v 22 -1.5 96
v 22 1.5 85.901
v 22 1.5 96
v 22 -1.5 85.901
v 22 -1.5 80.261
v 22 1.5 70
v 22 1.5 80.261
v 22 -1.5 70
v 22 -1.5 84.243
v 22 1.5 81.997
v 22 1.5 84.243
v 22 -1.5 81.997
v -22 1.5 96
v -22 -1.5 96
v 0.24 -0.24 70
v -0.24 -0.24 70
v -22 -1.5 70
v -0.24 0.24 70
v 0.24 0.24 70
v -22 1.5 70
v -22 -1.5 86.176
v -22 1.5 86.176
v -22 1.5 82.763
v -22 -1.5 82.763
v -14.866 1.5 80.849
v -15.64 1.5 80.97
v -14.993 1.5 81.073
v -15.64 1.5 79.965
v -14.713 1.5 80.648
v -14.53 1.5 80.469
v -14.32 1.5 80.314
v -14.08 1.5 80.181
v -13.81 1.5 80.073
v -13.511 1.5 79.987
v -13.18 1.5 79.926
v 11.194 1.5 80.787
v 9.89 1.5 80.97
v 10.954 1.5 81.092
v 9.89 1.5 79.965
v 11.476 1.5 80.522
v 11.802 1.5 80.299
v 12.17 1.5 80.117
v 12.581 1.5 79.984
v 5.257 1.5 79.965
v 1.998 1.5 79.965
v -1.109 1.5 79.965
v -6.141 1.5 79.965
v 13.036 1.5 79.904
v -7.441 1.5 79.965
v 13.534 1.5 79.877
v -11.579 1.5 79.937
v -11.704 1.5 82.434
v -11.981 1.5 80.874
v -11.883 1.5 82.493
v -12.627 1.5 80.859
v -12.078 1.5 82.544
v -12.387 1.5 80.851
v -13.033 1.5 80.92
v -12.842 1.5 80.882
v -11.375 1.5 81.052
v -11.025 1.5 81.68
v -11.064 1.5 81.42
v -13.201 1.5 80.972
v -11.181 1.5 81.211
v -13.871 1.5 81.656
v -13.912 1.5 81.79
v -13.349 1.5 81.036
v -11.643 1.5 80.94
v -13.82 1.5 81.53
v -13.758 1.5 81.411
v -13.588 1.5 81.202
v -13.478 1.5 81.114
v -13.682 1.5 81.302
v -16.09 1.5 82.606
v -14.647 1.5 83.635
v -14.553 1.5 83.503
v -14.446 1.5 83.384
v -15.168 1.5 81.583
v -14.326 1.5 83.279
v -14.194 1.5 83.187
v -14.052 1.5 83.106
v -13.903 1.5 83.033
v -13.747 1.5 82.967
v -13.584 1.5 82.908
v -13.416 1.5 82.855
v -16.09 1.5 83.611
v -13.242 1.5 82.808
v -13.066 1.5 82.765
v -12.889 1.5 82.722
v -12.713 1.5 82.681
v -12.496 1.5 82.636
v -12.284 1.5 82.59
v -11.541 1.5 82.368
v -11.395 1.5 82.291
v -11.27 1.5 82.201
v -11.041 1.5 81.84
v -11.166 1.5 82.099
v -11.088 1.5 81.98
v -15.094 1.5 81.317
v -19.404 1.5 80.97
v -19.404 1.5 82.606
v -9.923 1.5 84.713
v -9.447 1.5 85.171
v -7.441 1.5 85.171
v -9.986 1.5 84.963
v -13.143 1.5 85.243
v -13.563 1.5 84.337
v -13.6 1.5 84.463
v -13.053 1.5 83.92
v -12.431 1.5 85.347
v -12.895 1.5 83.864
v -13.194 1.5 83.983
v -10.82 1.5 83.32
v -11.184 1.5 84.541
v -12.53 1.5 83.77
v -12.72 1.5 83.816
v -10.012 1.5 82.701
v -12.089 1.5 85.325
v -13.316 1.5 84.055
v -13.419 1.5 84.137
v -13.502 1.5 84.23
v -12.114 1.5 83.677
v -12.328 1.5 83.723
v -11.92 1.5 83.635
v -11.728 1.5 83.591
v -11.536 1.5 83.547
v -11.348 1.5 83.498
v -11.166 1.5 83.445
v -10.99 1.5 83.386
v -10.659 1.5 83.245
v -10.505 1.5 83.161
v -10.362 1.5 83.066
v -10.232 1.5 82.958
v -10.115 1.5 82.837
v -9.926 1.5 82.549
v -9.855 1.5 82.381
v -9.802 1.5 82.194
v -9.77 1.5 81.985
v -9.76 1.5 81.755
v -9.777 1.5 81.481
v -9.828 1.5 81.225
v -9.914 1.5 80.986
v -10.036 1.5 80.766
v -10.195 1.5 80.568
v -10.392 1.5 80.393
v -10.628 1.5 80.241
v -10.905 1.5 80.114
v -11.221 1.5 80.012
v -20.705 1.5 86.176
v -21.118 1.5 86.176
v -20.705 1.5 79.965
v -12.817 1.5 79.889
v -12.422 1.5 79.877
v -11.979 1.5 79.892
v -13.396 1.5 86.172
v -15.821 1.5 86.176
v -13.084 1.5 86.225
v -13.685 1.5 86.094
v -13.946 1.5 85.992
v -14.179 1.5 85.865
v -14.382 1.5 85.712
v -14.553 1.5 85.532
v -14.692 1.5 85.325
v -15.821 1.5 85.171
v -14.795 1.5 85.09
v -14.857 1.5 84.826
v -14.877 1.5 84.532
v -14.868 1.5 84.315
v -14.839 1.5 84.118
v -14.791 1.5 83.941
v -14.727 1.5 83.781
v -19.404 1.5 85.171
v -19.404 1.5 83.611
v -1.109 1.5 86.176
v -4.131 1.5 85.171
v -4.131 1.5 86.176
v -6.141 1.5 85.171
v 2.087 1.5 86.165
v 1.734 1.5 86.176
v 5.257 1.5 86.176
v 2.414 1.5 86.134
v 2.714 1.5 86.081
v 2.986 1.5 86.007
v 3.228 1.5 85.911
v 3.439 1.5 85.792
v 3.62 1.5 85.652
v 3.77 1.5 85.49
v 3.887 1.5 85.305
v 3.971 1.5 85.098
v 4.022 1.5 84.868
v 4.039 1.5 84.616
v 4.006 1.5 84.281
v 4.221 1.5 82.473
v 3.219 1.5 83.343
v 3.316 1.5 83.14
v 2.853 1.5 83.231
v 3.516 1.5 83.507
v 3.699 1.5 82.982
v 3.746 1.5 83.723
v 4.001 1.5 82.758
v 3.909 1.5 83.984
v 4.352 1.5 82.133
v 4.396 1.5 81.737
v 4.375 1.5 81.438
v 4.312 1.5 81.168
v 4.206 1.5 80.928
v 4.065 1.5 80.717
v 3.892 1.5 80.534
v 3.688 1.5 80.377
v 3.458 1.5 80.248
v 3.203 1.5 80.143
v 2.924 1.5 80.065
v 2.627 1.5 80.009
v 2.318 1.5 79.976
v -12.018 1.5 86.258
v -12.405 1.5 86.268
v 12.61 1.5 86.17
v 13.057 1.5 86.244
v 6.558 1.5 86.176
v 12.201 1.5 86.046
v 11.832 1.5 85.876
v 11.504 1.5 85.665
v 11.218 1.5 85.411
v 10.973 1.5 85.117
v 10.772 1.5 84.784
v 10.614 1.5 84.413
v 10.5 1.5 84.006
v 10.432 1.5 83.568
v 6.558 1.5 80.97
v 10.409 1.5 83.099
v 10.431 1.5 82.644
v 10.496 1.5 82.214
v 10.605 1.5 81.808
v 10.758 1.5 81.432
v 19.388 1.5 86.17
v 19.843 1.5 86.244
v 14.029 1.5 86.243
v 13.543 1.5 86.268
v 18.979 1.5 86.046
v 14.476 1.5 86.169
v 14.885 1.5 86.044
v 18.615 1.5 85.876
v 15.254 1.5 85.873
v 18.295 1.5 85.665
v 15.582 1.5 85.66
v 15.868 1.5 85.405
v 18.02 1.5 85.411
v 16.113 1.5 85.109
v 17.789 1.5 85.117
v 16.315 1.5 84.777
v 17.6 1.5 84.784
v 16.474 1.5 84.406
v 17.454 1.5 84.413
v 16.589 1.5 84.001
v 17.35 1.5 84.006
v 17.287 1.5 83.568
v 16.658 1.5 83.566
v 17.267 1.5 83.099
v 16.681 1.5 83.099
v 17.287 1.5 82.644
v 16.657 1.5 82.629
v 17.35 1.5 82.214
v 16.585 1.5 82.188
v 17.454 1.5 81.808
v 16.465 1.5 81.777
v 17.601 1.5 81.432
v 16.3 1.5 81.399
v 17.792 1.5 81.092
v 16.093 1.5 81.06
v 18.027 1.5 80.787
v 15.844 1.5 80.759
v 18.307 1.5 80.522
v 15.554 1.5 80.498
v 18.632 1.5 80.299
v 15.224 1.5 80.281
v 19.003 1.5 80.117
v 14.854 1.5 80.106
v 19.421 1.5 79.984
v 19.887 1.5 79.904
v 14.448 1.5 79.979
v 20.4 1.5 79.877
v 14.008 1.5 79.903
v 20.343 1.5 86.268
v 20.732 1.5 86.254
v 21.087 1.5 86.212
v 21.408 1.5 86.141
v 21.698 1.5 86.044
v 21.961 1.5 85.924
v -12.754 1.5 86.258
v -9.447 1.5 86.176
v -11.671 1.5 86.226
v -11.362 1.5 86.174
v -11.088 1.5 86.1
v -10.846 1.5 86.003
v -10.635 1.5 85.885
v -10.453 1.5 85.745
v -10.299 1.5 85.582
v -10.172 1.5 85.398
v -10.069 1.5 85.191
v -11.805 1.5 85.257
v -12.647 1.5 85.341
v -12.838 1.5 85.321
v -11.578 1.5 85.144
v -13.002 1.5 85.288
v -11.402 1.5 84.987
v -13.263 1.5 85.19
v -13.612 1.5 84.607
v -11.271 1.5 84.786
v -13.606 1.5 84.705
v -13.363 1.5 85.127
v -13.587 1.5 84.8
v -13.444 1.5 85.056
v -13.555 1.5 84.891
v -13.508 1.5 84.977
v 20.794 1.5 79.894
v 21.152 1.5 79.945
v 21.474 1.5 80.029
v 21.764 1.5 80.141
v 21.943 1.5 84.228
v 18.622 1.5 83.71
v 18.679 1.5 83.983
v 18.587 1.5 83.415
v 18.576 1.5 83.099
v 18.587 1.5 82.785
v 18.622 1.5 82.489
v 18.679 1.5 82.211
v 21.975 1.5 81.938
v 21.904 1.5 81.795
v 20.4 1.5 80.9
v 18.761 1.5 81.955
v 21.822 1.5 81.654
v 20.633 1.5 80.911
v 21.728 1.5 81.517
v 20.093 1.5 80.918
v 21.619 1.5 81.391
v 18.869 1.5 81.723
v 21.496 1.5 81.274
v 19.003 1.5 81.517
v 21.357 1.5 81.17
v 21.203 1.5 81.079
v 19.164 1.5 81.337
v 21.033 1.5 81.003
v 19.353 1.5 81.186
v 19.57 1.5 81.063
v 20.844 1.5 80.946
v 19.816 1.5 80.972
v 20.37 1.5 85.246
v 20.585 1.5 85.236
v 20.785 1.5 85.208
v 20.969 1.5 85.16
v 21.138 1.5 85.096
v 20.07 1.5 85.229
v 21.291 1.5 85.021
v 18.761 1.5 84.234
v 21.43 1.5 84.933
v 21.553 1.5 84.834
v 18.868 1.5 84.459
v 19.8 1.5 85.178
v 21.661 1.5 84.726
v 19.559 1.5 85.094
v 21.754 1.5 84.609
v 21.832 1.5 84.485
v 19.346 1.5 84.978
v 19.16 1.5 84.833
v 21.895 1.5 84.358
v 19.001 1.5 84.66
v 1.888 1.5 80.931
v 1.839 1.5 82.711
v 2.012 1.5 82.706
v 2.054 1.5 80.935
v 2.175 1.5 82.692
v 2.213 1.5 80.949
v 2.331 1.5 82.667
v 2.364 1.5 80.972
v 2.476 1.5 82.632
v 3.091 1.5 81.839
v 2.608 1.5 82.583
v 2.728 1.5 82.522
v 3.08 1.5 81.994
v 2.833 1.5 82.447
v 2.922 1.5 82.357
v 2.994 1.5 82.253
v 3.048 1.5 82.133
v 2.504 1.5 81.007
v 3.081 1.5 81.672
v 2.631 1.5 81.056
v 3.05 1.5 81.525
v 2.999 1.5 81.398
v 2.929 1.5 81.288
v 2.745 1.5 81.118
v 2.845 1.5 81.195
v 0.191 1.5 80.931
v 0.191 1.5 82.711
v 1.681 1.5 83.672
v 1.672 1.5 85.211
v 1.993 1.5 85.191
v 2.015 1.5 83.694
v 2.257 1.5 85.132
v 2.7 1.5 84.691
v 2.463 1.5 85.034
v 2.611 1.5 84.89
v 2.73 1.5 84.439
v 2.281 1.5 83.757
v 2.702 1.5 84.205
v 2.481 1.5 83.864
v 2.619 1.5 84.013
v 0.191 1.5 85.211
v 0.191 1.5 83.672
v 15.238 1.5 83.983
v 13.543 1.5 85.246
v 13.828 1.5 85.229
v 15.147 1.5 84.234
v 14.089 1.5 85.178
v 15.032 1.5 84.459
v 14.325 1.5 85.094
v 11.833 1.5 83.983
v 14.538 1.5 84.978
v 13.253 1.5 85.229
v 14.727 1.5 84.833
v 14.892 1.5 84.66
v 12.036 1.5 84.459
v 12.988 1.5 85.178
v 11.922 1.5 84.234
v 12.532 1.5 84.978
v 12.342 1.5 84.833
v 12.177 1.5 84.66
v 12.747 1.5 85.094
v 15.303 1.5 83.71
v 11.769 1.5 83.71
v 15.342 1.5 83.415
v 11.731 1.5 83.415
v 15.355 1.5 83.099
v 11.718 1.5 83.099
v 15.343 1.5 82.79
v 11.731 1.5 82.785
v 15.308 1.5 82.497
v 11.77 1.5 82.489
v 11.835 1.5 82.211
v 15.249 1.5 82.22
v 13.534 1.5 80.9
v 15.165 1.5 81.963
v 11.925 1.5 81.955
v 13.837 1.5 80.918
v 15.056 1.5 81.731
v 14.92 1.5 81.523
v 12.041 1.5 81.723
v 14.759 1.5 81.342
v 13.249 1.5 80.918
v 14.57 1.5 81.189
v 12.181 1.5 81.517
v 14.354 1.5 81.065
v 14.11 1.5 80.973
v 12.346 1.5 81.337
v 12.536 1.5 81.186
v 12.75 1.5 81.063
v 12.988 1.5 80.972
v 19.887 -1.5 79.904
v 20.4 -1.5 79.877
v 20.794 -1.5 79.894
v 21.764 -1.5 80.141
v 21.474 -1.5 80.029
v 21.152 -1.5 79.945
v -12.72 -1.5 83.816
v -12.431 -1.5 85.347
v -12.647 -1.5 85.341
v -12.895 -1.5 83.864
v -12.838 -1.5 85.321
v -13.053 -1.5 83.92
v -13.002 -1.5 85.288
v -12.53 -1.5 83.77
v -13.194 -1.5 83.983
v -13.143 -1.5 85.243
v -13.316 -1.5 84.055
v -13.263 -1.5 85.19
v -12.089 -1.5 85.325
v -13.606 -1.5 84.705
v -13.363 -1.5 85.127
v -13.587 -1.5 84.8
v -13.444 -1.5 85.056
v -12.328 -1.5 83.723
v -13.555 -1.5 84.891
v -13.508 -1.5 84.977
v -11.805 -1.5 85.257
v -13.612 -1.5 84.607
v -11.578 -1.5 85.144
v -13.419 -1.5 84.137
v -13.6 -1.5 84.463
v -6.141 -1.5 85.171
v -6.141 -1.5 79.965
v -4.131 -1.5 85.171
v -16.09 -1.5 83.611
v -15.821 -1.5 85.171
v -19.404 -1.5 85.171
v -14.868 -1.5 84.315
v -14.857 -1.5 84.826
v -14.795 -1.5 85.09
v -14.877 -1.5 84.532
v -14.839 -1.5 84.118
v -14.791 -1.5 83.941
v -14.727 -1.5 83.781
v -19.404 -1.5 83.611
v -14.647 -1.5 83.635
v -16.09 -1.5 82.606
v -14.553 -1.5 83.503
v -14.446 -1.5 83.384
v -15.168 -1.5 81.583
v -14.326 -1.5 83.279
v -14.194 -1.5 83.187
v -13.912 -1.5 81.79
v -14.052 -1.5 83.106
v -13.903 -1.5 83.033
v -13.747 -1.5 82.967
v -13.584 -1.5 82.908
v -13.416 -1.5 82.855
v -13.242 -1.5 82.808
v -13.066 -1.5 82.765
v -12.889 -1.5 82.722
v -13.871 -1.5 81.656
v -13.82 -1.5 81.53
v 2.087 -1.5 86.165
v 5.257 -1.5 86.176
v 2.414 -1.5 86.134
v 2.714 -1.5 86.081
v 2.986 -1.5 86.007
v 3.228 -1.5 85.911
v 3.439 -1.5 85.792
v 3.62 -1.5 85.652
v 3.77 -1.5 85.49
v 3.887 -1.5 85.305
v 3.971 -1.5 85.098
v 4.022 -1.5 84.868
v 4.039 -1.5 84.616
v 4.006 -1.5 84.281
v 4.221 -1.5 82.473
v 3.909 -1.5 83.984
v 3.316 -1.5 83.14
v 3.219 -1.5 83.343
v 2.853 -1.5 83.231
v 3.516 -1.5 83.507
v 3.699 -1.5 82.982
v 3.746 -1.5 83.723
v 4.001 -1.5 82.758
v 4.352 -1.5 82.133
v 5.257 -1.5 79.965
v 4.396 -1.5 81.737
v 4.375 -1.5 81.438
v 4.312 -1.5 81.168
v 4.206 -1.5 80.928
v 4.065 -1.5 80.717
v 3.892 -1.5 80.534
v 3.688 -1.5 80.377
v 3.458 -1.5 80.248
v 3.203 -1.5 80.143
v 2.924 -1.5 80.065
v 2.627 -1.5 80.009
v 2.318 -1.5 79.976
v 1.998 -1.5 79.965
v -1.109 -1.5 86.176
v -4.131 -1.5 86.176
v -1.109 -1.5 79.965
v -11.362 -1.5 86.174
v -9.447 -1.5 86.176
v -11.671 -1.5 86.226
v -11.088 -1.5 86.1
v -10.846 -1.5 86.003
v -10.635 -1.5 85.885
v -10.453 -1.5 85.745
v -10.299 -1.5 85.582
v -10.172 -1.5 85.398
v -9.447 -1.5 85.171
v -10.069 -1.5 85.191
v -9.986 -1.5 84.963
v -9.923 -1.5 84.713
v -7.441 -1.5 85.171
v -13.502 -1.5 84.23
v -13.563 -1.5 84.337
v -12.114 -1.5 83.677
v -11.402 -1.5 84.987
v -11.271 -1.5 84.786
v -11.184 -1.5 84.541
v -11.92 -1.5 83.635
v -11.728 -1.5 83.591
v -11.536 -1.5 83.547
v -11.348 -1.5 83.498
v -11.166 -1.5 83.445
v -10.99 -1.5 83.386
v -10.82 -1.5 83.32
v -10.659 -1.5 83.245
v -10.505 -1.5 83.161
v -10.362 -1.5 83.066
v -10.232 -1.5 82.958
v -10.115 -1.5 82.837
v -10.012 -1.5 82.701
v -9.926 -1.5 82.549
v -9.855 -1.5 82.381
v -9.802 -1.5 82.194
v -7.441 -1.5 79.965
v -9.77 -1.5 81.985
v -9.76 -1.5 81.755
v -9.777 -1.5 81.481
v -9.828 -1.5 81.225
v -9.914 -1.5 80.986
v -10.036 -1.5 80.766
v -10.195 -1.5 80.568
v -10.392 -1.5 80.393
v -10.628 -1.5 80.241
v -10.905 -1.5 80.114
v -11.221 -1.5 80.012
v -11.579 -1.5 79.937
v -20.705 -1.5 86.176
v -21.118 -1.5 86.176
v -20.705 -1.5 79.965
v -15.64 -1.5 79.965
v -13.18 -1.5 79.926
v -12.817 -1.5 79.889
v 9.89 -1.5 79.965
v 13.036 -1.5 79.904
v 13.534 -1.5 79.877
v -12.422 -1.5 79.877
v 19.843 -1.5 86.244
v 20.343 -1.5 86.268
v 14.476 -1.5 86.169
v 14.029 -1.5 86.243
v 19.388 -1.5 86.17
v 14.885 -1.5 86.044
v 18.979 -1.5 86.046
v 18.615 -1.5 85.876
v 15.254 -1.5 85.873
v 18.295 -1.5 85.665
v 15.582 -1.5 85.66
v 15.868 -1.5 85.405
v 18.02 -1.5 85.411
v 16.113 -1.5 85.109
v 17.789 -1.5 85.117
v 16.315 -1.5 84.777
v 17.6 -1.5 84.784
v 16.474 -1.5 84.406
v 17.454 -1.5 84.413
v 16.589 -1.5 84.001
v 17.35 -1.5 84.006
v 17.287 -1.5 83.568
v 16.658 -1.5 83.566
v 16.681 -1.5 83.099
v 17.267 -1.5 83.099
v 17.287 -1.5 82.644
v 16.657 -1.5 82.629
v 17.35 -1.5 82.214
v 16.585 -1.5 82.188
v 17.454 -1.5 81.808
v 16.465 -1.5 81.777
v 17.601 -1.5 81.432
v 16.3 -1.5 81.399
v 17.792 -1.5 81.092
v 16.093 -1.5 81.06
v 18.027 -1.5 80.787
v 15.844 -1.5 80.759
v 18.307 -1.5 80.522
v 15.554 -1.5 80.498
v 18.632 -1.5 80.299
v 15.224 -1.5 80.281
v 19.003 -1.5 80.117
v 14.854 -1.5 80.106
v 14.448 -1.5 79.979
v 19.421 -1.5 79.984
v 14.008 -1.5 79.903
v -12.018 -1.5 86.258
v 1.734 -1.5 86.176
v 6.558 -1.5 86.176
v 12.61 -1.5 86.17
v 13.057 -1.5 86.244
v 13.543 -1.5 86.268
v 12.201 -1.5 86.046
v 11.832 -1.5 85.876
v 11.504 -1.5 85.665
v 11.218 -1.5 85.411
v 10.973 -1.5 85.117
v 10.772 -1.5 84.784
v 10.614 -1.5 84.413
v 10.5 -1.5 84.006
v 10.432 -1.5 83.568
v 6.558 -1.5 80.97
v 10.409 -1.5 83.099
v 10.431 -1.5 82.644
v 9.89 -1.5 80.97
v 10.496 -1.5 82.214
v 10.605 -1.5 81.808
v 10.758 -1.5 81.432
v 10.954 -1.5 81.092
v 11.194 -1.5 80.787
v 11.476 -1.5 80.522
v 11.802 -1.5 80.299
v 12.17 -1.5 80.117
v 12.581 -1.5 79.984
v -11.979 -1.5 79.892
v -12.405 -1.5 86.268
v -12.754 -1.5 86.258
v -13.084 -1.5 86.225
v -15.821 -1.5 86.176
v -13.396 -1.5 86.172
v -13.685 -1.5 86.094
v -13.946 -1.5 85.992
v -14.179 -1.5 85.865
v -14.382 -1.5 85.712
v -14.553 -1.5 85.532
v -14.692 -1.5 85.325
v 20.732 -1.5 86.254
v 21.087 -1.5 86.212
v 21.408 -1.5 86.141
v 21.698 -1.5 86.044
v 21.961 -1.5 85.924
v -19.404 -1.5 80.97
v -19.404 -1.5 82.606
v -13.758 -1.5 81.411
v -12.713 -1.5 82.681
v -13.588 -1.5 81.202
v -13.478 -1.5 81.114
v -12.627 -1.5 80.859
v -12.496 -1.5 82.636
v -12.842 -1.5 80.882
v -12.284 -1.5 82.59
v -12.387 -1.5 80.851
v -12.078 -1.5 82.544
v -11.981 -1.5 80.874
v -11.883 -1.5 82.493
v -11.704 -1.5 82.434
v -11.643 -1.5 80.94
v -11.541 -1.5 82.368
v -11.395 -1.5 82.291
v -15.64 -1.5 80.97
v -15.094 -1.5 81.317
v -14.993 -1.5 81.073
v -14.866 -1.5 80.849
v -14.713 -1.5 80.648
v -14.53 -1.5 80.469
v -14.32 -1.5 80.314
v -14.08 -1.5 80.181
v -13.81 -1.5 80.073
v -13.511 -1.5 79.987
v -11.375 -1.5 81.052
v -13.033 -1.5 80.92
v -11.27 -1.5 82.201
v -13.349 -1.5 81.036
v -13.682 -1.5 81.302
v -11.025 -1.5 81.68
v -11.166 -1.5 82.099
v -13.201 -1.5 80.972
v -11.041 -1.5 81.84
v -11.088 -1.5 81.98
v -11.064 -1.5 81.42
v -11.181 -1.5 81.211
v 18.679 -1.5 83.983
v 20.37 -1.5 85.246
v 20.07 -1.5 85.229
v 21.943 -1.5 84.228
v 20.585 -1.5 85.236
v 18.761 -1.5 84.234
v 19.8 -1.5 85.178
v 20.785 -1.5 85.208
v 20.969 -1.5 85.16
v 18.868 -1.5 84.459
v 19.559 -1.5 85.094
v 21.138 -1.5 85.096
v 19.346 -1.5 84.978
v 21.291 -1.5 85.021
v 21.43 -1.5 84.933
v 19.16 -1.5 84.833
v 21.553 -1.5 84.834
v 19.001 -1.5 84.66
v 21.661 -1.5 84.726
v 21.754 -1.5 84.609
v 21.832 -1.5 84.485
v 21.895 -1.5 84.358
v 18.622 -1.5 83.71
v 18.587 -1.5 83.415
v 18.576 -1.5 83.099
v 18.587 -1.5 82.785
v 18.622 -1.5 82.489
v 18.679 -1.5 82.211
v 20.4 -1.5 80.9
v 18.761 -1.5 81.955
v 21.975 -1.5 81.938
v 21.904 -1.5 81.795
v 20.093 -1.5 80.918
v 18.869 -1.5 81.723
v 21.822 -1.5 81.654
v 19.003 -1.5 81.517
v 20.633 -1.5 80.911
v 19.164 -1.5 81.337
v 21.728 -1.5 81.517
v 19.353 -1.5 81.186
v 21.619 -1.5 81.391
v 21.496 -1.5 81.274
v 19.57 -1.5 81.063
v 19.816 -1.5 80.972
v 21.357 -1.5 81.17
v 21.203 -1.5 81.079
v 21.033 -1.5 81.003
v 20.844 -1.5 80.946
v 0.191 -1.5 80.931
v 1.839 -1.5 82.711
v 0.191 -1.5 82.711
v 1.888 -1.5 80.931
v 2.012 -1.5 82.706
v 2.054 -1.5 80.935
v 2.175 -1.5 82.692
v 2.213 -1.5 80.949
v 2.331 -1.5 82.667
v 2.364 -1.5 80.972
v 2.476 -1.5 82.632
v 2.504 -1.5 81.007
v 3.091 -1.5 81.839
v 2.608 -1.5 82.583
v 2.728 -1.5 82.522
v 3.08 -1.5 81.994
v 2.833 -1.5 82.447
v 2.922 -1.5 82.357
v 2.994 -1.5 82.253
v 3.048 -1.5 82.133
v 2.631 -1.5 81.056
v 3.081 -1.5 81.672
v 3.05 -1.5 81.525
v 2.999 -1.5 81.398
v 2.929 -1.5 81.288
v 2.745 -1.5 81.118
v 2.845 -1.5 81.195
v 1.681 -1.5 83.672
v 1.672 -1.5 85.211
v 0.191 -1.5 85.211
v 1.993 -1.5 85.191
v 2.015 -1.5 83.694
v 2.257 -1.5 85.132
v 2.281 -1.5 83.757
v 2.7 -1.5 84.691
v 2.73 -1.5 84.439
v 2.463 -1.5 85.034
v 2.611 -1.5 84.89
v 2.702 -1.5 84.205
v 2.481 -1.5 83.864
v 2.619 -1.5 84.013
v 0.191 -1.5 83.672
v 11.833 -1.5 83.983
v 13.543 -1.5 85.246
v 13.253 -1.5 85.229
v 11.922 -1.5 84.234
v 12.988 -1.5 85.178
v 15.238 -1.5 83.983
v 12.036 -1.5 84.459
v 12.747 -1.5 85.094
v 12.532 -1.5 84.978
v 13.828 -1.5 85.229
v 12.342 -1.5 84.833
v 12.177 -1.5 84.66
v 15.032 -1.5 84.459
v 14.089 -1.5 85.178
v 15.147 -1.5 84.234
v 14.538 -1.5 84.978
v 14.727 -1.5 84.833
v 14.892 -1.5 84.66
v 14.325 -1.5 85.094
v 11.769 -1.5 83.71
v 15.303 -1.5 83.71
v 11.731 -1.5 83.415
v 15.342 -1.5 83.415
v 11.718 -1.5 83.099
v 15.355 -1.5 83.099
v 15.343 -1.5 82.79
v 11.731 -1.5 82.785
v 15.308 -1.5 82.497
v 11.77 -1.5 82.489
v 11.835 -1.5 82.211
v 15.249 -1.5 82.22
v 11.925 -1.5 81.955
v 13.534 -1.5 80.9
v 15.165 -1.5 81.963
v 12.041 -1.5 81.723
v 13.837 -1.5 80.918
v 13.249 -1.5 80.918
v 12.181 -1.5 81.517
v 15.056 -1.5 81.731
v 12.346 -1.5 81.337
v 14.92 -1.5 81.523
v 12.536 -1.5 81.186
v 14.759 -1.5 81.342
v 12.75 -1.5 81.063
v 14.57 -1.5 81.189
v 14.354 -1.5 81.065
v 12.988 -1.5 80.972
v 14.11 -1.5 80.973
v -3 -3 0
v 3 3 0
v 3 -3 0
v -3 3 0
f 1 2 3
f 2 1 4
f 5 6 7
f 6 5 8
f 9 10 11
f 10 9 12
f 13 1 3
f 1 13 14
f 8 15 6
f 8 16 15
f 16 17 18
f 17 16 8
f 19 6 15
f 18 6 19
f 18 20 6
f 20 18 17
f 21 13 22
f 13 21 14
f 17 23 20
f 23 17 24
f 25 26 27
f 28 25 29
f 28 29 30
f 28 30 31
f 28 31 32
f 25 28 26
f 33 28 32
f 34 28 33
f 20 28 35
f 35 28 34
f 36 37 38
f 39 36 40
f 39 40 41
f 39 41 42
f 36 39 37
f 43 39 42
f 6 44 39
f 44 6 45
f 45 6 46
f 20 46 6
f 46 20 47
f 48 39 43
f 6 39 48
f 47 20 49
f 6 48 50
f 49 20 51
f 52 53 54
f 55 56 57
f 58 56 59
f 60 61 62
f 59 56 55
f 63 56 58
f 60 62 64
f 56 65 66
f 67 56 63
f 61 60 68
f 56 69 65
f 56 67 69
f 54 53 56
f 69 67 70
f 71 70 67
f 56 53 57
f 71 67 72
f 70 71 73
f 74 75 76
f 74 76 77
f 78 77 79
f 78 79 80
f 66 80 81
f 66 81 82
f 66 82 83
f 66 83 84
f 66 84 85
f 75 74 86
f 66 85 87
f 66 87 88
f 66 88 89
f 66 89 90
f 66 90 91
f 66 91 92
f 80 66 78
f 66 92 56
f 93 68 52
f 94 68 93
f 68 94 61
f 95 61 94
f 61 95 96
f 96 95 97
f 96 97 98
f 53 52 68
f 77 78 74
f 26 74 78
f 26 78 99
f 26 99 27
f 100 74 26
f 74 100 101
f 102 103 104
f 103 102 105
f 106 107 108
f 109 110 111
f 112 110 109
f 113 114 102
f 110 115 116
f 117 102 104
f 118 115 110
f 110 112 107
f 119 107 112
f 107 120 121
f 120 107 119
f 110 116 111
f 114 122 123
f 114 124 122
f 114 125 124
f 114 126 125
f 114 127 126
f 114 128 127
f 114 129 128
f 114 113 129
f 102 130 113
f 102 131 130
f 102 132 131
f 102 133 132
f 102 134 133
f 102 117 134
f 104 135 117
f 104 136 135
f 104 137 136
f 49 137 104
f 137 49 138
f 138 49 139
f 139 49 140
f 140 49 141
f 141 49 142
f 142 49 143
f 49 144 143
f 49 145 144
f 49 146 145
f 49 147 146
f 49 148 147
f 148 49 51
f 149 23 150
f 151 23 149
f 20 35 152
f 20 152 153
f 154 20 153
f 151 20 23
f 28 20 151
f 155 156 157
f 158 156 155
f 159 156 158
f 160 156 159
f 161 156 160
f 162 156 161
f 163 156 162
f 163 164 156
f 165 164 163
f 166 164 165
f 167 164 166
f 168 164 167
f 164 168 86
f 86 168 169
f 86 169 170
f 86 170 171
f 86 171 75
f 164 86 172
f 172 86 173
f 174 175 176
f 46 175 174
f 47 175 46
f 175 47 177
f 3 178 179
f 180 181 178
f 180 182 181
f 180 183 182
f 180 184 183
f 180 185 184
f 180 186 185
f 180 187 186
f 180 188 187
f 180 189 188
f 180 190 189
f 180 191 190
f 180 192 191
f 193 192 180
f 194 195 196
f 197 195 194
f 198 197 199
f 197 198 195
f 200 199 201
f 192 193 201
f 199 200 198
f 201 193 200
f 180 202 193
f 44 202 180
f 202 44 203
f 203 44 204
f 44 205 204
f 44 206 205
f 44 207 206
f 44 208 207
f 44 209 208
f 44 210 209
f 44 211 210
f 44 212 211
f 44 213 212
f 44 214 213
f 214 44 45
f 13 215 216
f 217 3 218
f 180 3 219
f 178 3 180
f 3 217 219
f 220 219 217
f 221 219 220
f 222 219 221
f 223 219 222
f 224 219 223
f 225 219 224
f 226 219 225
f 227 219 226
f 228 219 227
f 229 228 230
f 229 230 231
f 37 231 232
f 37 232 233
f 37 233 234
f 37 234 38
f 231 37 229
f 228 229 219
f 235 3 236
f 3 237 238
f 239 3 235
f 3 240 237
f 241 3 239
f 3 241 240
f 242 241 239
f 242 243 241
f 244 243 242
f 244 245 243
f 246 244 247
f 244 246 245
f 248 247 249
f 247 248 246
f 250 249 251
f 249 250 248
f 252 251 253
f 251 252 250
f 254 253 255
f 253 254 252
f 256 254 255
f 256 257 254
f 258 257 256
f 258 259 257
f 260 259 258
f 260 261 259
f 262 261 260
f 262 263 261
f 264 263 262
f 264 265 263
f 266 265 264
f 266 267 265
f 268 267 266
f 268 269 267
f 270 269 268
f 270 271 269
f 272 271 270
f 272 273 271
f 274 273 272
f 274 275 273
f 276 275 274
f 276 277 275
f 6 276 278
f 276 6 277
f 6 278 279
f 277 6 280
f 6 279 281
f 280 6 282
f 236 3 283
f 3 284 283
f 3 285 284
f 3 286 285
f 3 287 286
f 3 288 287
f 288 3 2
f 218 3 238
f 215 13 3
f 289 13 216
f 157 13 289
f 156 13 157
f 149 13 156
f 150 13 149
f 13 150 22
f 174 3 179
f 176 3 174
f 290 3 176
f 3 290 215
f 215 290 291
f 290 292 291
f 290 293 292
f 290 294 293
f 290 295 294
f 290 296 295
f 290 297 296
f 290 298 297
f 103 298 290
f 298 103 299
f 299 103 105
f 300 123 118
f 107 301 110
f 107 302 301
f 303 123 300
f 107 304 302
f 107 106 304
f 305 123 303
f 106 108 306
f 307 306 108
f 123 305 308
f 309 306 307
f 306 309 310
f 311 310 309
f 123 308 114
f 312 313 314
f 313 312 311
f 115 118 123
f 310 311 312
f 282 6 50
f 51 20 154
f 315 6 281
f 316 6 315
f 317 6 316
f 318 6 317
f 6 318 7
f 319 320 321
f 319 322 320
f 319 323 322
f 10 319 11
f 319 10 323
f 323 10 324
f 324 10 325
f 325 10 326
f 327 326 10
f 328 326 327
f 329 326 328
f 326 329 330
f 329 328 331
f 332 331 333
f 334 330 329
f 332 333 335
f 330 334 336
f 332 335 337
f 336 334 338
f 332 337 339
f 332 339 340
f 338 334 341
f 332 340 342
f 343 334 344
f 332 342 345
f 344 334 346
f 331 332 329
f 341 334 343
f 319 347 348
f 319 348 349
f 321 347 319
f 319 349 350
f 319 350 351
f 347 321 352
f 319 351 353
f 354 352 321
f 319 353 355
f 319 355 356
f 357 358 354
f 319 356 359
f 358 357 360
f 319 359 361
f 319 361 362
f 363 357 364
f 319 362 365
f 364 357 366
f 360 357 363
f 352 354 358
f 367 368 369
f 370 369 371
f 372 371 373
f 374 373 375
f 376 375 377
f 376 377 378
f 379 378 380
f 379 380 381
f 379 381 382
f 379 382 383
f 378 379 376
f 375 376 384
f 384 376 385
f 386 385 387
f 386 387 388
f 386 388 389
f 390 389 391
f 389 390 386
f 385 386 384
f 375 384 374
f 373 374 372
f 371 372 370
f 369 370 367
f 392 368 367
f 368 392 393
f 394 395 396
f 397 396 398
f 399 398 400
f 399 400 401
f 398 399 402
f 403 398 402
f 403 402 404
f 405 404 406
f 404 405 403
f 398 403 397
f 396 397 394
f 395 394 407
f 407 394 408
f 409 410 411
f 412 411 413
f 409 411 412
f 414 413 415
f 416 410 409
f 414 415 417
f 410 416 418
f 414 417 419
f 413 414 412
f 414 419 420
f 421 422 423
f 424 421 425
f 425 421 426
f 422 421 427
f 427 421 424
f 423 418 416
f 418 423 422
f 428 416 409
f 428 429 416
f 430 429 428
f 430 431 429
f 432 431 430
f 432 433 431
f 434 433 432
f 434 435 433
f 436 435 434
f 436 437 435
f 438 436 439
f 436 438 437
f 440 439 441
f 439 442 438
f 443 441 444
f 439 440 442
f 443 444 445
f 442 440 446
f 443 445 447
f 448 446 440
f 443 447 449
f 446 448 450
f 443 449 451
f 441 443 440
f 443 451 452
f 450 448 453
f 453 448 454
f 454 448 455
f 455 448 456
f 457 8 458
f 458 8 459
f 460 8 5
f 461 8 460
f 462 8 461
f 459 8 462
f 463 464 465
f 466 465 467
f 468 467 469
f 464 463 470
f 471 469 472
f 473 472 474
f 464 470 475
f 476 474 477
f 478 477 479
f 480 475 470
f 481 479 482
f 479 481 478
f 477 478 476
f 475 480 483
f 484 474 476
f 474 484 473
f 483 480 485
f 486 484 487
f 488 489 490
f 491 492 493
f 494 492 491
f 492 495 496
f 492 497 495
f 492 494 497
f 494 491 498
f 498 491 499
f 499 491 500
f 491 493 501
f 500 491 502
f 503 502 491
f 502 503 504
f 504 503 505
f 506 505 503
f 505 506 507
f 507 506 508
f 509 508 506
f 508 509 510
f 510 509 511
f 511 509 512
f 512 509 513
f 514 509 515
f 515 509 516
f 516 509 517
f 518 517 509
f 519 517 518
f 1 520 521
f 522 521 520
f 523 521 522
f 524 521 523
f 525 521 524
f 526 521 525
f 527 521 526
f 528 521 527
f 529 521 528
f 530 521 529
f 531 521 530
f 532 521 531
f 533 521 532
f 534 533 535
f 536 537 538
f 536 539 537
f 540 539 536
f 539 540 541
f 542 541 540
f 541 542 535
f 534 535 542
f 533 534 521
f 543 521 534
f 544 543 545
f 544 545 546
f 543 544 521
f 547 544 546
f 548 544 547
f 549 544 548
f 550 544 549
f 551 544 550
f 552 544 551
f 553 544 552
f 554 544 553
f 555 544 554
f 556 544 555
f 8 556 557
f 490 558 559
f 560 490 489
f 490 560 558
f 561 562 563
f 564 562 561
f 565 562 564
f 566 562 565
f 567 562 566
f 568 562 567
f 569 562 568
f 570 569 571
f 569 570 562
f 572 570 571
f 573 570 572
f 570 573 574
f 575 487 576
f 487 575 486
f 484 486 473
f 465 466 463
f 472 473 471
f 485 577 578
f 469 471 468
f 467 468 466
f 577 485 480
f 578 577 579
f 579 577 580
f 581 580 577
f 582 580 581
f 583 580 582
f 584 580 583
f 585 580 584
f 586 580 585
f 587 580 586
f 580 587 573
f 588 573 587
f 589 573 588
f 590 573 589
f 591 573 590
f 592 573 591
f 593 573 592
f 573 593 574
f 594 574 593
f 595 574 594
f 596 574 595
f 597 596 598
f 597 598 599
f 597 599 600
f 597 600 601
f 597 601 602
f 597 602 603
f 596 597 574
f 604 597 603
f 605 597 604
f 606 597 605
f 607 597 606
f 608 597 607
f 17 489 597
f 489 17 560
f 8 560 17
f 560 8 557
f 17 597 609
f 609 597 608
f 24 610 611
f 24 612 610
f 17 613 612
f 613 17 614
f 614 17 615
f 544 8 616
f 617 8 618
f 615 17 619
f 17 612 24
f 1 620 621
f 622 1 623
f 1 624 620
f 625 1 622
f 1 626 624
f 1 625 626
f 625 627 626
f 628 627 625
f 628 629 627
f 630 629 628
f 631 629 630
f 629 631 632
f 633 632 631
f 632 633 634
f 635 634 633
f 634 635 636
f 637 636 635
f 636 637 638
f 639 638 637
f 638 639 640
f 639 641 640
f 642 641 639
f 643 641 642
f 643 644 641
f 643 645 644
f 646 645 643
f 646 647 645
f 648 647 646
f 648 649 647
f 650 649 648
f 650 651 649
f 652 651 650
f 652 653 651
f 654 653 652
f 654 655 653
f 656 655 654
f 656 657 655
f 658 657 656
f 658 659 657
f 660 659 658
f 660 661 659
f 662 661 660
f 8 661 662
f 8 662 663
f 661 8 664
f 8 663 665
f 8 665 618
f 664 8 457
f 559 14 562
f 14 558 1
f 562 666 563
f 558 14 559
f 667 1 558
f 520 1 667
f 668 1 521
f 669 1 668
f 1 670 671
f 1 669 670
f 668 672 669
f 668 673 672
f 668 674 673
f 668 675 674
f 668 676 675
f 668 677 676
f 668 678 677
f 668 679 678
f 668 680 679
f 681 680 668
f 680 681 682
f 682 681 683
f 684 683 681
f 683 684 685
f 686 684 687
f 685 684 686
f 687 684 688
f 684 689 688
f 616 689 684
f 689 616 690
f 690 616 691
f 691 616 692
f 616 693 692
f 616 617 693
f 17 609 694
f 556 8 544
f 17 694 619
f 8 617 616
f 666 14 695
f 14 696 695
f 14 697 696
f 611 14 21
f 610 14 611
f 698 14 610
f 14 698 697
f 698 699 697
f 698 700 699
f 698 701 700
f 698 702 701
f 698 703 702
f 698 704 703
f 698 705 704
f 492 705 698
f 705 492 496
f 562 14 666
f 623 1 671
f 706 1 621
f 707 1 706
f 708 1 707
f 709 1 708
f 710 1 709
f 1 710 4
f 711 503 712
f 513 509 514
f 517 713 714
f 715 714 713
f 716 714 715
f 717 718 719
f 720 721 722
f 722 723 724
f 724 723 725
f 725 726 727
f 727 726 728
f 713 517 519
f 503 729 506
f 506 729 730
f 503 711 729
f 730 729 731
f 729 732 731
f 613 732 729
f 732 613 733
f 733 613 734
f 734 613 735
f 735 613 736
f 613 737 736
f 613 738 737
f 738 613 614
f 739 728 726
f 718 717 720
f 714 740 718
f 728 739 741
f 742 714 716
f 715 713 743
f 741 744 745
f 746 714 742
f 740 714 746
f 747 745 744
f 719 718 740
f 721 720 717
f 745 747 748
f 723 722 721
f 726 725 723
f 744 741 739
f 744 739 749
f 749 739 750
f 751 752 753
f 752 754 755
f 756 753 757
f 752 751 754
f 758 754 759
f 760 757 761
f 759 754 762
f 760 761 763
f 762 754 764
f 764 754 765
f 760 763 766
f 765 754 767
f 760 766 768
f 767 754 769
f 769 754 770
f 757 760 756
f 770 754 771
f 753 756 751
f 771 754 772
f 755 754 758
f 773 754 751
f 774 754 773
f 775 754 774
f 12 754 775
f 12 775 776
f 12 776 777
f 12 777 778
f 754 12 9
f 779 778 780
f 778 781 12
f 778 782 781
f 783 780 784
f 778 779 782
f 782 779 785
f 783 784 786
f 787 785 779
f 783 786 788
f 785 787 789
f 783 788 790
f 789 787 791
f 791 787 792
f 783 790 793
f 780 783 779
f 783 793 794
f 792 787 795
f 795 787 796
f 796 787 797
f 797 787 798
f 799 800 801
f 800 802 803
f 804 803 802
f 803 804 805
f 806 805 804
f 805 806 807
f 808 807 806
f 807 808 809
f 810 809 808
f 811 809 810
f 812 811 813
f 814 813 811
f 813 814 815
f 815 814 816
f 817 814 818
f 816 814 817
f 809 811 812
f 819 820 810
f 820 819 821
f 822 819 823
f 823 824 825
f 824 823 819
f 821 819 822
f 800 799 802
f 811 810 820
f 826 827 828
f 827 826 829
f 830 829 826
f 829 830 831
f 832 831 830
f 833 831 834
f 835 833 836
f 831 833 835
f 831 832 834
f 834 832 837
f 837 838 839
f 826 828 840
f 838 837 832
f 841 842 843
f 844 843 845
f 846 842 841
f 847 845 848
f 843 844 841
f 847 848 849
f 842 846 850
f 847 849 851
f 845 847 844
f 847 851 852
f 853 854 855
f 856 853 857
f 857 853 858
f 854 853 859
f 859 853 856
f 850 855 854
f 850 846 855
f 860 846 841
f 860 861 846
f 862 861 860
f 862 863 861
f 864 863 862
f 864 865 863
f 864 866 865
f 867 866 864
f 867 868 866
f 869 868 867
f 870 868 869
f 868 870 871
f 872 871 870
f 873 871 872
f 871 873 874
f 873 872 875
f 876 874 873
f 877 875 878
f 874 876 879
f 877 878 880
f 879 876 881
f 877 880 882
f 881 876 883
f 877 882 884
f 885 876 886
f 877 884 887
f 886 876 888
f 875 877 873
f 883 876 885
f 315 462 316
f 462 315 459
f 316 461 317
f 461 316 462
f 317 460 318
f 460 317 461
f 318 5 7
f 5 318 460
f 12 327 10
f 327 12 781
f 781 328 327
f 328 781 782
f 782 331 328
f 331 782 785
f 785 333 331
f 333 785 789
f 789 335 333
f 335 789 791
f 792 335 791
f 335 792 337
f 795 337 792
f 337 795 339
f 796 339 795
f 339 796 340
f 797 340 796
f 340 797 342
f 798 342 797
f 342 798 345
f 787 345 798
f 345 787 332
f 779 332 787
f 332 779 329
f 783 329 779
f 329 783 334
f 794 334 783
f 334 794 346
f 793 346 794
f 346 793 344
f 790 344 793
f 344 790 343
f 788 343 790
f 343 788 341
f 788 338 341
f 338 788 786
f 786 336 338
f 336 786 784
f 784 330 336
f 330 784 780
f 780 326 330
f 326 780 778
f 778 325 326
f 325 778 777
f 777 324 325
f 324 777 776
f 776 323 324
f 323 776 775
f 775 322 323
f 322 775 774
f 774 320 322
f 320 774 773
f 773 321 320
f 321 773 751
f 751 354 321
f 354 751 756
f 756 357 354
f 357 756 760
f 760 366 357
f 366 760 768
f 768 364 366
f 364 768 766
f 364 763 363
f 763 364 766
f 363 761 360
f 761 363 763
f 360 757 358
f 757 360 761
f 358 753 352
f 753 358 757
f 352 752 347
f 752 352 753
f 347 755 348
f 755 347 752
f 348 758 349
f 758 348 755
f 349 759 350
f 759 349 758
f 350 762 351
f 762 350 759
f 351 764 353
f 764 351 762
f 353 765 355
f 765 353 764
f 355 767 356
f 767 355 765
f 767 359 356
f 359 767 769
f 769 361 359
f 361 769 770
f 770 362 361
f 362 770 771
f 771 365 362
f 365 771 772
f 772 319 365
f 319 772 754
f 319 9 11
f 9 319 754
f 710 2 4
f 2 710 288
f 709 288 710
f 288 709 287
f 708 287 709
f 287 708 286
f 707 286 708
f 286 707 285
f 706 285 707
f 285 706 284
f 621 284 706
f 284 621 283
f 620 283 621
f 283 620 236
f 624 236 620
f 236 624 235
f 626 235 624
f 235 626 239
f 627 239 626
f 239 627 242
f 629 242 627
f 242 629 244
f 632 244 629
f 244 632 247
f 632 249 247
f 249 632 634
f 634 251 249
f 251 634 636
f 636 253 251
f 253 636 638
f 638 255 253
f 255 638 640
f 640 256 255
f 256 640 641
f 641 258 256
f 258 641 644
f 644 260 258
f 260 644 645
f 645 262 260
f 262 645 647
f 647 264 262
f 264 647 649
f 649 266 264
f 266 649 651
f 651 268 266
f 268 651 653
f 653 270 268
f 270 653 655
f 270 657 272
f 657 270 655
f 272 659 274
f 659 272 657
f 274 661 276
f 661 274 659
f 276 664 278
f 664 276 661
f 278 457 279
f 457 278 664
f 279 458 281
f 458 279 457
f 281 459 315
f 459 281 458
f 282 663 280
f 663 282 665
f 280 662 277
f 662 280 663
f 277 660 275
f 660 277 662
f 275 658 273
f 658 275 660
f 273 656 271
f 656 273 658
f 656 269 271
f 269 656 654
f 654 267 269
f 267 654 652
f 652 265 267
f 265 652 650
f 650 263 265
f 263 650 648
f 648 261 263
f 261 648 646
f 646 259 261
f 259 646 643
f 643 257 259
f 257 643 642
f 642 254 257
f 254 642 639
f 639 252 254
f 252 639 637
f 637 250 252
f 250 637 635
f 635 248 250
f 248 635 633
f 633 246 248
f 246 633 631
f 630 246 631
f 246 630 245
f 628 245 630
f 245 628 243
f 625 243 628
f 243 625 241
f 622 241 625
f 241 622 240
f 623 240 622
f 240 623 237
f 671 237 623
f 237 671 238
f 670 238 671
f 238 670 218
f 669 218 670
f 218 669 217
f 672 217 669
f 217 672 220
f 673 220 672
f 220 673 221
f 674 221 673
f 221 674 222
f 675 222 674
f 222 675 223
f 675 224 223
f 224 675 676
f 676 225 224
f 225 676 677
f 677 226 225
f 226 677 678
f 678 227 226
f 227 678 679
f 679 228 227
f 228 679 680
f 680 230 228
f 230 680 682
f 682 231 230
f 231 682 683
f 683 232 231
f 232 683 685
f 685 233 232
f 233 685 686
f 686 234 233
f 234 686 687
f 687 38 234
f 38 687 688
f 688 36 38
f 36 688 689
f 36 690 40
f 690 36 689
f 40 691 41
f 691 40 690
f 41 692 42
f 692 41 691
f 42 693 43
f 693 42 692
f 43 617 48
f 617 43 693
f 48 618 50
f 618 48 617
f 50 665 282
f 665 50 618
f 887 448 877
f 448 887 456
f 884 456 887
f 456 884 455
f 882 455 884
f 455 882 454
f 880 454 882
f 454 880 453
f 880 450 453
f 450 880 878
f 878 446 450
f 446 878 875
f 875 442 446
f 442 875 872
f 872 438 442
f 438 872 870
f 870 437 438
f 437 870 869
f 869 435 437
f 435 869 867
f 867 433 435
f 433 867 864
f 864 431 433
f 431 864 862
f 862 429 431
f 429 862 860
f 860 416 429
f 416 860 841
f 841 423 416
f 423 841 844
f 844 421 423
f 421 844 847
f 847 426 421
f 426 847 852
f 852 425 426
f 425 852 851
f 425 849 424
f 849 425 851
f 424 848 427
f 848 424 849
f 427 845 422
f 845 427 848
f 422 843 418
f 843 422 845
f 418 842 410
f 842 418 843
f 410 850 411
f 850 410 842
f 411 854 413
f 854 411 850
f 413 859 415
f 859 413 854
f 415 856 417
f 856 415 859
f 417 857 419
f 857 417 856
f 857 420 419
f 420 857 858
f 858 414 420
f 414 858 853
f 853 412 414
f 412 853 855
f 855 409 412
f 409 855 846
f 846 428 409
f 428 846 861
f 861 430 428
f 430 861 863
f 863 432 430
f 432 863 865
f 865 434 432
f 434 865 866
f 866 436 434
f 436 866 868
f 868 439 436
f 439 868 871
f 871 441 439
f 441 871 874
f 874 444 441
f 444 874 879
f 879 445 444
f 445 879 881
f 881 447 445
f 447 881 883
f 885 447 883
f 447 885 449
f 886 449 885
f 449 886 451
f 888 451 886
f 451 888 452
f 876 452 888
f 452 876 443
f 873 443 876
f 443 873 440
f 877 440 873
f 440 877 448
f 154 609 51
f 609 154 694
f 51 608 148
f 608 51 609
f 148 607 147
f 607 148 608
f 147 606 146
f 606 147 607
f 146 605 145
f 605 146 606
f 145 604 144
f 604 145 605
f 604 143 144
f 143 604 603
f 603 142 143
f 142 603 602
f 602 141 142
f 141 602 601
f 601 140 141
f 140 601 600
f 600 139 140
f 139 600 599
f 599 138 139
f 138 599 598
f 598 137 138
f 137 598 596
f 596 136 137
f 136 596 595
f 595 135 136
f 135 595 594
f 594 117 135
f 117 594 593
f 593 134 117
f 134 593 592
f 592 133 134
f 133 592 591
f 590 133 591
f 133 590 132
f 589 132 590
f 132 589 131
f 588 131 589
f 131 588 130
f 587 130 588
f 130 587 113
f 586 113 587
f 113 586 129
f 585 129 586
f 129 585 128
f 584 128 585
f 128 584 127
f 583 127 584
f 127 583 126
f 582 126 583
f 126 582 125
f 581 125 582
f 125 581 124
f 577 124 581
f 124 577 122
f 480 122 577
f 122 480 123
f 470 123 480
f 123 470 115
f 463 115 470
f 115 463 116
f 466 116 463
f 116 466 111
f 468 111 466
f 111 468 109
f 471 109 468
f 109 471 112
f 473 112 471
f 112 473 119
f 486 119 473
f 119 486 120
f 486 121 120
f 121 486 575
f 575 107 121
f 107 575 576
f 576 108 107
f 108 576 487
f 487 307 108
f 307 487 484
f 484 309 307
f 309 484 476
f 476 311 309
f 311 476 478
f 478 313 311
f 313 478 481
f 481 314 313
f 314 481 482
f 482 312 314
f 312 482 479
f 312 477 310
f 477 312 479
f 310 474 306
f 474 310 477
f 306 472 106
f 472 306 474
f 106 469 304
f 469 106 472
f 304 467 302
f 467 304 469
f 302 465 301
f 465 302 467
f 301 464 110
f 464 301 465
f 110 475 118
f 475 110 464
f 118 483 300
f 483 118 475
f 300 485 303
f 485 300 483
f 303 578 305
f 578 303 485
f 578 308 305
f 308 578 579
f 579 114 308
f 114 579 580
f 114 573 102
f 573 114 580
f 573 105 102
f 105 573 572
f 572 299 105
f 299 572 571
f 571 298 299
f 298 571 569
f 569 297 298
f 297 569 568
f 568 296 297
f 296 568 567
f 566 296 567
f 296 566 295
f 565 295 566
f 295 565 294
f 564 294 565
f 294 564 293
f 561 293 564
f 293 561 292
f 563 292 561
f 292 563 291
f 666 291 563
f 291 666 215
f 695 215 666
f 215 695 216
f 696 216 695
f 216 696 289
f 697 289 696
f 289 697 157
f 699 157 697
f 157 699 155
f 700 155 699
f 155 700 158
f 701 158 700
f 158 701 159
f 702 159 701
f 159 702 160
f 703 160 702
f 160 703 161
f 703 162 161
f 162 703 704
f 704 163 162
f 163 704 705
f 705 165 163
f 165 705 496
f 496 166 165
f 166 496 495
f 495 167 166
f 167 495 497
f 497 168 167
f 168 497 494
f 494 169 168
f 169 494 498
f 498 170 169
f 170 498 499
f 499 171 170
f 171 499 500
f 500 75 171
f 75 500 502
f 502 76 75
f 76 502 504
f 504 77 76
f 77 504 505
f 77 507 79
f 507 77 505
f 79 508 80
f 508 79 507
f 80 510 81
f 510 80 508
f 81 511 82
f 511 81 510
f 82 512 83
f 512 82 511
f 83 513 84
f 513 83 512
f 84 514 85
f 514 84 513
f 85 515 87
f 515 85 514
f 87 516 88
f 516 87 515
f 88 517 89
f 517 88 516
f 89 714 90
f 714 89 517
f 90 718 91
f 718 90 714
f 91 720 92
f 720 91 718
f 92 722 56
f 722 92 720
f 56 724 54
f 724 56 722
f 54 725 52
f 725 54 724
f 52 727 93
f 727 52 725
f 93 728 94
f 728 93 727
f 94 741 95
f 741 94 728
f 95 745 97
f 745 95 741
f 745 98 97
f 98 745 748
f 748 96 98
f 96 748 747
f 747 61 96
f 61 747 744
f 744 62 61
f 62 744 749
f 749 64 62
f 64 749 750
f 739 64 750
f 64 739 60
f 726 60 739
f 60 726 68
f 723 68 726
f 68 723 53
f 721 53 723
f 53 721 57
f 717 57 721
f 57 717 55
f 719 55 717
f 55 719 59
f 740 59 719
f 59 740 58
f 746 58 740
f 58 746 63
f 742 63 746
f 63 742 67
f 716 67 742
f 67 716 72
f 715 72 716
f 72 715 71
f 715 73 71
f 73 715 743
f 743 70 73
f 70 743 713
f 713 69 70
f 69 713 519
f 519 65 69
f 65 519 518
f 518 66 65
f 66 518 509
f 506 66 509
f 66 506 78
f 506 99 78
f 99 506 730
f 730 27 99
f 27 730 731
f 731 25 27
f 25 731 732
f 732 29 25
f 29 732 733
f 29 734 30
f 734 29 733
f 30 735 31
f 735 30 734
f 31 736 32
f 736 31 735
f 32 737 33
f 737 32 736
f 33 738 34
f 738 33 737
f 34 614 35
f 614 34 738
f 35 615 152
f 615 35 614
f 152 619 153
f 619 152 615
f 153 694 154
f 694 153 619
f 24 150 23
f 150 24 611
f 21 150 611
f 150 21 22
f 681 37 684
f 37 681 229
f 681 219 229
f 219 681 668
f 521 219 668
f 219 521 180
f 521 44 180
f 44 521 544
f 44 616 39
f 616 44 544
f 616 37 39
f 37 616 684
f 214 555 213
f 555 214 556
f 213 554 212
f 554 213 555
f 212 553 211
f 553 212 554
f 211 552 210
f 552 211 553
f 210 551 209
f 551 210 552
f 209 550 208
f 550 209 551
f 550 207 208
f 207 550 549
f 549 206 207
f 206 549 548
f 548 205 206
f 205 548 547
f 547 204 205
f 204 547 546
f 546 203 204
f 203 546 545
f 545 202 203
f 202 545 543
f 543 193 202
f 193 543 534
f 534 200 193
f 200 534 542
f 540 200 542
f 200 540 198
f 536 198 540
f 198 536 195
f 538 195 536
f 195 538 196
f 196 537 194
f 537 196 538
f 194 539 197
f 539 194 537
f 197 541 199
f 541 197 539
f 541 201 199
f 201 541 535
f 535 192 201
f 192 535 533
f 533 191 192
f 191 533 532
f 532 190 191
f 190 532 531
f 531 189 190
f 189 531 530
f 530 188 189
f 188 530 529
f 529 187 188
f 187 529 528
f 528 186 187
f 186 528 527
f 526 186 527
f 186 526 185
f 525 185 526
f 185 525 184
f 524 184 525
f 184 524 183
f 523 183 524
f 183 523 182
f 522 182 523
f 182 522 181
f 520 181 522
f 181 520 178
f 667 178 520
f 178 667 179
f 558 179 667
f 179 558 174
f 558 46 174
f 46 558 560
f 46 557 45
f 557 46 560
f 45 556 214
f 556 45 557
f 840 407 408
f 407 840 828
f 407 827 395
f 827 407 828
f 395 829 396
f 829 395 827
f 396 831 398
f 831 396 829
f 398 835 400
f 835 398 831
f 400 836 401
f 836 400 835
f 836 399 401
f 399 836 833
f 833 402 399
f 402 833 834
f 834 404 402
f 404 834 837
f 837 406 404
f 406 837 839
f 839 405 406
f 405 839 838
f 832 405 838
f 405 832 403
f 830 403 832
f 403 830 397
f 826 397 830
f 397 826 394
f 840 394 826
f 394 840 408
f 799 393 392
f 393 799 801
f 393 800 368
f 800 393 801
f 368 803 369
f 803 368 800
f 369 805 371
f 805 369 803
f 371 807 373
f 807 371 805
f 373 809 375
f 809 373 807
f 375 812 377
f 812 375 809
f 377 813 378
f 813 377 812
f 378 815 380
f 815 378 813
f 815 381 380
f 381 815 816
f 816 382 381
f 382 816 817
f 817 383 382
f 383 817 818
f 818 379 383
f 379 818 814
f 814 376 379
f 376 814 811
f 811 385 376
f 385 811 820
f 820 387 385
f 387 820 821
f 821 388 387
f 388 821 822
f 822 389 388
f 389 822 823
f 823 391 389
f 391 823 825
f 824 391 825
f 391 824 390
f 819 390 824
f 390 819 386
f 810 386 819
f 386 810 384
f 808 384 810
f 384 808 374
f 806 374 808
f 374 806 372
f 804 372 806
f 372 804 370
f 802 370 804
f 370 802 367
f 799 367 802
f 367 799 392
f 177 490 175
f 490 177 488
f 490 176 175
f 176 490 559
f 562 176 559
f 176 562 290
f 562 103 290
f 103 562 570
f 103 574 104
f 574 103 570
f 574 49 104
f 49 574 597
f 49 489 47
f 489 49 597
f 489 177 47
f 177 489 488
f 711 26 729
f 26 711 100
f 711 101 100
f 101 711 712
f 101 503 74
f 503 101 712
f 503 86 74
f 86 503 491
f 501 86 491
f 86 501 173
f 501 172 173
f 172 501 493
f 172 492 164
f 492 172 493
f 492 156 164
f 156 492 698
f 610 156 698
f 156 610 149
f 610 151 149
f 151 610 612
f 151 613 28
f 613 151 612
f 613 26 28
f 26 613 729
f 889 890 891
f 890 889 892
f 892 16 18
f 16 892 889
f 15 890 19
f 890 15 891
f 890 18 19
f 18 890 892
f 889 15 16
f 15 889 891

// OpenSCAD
// Lowveld Grove — Zone marker stake
//
// A small labeled ground stake for the demo table — push one into each of
// the four pots/soil trays so judges can see "North block", "East block",
// etc. matching the dashboard's zone names at a glance.
//
// Print 4x total: change ZONE_LABEL below, re-render (F6), export STL,
// print, then repeat for the other three zone names.

ZONE_LABEL = "WEST BLOCK";  // change to NORTH BLOCK / EAST BLOCK / SOUTH BLOCK / WEST BLOCK per print

stake_width = 6;     // stake cross-section at its base (mm)
stake_length = 70;   // how far it goes into the soil (mm)
flag_width = 44;
flag_height = 26;
flag_thickness = 3;
text_size = 6.5;

// Tapered stake — square cross-section at the base, narrowing toward the tip.
module stake() {
  linear_extrude(height = stake_length, scale = 0.08)
    square([stake_width, stake_width], center = true);
}

// Flag sits on top of the stake, with the zone name embossed (cut) through it.
module flag() {
  translate([0, 0, stake_length]) {
    difference() {
      translate([-flag_width / 2, -flag_thickness / 2, 0])
        cube([flag_width, flag_thickness, flag_height]);

      translate([0, 0, flag_height / 2])
        rotate([90, 0, 0])
          linear_extrude(height = flag_thickness + 2, center = true)
            text(
              ZONE_LABEL,
              size = text_size,
              halign = "center",
              valign = "center",
              font = "Liberation Sans:style=Bold"
            );
    }
  }
}

stake();
flag();
